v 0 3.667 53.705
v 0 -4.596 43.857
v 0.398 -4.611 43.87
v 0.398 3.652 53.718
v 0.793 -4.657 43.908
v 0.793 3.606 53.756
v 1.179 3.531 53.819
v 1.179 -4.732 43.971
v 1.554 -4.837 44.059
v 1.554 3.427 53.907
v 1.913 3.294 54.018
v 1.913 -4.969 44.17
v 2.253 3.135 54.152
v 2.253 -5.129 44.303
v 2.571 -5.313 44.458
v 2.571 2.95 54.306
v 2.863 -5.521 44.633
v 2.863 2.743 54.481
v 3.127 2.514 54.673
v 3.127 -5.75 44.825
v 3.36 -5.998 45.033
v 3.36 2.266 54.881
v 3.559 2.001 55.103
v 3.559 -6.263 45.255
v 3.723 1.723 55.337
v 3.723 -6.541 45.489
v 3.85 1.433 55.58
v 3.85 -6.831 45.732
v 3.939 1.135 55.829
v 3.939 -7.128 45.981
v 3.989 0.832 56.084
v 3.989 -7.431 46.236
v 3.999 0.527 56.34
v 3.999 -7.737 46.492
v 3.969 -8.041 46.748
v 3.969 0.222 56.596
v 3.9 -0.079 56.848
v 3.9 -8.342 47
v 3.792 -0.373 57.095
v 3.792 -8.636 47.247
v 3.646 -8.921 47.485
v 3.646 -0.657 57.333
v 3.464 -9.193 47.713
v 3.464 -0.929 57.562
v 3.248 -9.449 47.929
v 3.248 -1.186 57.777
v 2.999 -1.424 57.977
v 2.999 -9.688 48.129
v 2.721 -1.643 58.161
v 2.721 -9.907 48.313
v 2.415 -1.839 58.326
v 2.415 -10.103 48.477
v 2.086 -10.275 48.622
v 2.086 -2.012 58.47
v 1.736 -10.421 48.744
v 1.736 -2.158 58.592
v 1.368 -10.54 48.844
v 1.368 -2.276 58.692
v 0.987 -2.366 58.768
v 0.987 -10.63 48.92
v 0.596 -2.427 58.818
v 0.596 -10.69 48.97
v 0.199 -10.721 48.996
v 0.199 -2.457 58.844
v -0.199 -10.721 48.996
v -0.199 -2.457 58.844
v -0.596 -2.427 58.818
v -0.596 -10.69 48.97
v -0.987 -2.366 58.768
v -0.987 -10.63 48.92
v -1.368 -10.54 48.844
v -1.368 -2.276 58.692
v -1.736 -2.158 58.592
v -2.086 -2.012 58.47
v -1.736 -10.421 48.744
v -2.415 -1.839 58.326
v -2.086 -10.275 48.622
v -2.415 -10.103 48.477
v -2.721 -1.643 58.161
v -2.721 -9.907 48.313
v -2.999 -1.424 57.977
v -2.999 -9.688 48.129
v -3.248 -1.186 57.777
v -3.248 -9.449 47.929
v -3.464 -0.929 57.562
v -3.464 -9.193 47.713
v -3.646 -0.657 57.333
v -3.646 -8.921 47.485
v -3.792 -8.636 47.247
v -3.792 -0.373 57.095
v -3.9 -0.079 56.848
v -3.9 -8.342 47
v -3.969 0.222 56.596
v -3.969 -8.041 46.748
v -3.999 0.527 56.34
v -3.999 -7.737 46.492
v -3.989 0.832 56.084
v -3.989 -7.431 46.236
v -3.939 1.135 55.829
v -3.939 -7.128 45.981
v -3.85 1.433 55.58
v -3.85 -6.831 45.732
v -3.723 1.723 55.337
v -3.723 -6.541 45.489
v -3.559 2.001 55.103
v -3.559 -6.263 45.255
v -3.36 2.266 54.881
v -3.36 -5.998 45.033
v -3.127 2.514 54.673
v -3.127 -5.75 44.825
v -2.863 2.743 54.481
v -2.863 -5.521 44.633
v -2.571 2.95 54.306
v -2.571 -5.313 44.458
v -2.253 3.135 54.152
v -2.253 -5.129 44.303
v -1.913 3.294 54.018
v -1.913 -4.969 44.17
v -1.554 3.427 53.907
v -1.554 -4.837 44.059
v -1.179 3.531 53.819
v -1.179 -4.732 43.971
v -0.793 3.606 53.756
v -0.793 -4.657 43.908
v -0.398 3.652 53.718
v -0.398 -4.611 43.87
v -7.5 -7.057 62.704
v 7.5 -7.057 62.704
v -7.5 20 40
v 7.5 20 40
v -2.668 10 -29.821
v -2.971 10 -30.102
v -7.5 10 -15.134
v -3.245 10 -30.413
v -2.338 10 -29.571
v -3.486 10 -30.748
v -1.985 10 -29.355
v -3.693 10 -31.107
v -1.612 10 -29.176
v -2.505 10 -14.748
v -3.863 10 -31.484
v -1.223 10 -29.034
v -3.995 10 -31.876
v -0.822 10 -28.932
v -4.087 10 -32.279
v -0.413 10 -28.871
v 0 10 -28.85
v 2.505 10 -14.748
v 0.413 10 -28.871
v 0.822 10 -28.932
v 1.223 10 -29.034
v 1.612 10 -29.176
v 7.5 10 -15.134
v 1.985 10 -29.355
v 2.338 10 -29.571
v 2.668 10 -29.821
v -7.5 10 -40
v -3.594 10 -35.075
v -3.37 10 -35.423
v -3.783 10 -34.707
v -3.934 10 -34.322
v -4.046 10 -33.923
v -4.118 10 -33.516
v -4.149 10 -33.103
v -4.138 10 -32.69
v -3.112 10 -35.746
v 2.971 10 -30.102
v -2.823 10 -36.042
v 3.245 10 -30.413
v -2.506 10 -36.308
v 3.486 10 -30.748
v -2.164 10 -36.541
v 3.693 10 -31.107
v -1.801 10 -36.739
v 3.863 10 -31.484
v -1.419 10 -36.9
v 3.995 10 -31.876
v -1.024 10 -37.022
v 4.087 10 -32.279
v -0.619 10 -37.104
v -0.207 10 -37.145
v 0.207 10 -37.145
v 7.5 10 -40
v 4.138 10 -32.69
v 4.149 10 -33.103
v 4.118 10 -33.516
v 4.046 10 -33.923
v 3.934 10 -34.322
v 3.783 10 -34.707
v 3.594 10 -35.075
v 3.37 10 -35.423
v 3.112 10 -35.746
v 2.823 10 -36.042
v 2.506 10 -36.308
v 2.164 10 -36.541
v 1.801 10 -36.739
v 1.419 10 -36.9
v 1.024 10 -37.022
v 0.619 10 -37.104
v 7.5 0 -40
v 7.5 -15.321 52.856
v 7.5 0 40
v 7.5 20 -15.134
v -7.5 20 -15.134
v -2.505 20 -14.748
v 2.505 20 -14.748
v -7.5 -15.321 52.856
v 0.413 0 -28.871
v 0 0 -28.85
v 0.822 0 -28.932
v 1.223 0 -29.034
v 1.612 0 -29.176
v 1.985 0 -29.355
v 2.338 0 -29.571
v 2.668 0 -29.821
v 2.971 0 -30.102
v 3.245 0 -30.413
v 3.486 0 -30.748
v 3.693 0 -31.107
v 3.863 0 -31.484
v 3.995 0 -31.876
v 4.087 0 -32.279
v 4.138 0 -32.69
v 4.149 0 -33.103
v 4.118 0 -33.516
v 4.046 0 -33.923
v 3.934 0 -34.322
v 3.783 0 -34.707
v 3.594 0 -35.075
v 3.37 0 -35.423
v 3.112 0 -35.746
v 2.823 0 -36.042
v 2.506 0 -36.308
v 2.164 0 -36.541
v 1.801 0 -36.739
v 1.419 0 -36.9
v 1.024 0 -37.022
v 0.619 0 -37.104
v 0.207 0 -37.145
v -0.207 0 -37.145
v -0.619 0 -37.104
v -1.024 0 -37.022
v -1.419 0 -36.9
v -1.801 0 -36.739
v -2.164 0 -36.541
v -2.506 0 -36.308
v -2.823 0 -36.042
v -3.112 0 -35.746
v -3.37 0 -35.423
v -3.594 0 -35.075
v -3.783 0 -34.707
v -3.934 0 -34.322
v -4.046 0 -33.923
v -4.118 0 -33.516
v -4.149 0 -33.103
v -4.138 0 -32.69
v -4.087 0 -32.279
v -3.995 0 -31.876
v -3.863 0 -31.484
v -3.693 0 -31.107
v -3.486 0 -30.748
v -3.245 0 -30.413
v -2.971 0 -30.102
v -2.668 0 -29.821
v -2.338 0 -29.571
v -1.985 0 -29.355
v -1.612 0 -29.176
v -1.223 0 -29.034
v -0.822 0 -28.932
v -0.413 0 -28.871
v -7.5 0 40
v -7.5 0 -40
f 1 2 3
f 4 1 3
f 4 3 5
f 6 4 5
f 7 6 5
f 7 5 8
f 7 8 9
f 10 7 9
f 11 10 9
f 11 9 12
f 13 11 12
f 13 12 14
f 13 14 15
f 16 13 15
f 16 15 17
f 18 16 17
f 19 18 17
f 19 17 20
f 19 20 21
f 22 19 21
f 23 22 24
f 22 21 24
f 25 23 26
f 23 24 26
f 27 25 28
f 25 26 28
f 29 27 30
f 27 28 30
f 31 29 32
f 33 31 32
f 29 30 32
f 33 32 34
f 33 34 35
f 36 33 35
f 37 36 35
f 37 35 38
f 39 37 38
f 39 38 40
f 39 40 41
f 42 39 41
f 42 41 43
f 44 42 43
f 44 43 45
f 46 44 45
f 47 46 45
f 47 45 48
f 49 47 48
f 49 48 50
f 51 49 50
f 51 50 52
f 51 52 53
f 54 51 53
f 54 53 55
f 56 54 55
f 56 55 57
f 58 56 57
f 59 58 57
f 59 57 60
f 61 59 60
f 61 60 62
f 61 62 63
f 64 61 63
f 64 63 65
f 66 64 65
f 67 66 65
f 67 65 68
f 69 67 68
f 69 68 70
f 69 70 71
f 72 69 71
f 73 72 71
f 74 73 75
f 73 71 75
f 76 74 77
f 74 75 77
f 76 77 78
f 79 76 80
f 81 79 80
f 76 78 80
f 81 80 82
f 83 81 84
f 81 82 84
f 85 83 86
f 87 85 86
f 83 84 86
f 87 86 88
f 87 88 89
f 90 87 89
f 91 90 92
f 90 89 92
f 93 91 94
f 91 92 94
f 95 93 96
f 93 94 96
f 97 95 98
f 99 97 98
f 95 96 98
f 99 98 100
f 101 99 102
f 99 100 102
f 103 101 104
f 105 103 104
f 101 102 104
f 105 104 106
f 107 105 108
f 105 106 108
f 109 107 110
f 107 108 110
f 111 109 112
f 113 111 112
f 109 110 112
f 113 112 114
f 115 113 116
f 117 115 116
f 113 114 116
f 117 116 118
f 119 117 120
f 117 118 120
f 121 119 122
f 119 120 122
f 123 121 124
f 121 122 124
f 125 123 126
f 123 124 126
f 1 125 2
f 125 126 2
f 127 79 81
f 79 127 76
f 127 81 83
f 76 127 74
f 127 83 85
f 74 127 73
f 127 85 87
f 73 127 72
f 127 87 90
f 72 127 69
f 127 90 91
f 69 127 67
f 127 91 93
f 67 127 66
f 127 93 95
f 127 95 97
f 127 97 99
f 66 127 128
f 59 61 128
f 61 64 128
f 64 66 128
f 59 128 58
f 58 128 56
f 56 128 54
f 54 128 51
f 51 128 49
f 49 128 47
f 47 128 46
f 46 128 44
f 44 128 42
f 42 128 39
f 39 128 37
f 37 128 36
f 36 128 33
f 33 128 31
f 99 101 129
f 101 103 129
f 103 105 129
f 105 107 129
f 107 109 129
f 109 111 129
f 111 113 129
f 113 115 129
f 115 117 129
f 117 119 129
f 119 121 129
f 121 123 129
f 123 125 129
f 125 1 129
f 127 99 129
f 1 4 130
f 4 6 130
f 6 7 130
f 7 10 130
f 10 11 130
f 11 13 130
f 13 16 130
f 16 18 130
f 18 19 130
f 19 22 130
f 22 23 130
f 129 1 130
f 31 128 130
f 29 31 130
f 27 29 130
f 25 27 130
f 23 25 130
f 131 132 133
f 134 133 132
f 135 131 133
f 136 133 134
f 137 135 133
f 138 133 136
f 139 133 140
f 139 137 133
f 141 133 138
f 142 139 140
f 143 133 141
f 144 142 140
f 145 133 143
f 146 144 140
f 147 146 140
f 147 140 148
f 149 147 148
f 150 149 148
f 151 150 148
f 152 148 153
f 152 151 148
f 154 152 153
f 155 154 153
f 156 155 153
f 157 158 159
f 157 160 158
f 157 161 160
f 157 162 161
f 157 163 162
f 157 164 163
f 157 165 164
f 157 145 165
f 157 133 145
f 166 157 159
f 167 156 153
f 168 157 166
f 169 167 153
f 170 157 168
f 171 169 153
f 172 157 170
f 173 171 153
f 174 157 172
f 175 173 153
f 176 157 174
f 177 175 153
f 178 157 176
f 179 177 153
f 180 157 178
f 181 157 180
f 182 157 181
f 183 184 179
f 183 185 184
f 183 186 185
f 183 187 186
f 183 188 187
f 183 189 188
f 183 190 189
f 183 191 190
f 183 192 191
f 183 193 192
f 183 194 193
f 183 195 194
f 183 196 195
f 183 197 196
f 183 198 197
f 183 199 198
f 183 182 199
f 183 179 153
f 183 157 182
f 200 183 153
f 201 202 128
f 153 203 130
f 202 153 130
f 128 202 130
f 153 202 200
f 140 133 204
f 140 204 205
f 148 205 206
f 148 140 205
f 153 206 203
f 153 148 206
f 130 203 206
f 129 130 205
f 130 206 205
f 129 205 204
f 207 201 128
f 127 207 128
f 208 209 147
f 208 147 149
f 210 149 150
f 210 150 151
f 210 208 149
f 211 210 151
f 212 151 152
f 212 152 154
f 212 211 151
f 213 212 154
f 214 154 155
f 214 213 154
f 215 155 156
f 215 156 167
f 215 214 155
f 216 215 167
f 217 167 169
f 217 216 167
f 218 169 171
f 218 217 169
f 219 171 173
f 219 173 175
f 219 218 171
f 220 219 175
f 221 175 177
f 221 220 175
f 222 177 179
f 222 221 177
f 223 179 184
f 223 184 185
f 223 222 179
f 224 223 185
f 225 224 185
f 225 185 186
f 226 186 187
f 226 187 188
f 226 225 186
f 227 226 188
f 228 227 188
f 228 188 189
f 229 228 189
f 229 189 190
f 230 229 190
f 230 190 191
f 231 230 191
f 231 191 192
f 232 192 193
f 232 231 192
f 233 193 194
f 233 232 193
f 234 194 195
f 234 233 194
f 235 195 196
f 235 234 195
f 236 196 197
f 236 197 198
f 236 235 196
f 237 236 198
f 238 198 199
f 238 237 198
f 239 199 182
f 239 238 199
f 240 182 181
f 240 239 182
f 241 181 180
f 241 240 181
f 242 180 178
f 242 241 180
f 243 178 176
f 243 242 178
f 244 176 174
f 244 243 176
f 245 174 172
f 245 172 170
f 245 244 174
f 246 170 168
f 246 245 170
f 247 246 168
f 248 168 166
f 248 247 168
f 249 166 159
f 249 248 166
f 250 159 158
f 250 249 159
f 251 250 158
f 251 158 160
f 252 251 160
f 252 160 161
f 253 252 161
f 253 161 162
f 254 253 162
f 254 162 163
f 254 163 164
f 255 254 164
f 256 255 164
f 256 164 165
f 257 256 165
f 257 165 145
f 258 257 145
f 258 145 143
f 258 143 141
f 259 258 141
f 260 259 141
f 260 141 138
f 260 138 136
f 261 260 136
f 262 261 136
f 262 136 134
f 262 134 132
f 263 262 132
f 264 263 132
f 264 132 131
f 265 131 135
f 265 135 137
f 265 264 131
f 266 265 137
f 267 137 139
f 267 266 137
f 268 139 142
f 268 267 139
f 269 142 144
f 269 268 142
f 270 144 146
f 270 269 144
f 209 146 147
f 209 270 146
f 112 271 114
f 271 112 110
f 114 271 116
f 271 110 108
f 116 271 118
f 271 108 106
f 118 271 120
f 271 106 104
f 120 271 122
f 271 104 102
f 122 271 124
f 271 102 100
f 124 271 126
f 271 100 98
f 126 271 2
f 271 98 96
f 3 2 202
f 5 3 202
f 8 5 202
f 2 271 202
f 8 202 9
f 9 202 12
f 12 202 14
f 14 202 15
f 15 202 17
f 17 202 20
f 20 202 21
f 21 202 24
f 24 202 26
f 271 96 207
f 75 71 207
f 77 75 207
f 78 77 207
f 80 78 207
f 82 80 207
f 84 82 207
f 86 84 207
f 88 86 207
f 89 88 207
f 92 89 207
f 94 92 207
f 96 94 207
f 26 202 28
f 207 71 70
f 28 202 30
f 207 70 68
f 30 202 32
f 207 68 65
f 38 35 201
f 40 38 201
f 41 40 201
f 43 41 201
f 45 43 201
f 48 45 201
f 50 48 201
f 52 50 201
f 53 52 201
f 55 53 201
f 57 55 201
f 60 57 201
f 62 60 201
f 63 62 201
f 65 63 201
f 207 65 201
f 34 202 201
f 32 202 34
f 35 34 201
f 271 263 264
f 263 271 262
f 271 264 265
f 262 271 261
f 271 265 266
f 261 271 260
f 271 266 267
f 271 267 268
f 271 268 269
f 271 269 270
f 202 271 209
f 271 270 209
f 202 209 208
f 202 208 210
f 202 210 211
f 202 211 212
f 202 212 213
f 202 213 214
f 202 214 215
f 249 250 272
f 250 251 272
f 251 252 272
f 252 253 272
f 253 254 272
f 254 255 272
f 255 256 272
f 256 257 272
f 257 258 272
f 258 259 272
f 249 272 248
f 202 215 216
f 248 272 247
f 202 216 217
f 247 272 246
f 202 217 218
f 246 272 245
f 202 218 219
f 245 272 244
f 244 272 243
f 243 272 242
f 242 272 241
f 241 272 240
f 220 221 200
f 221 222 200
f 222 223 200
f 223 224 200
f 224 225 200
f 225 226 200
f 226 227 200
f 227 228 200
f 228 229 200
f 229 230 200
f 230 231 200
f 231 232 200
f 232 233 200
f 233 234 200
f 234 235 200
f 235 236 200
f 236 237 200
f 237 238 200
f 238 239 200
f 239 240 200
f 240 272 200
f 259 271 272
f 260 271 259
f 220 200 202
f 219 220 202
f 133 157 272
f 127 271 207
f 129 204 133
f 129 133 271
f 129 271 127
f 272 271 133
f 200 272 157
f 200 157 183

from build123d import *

# Parameters (mm, degrees)
SKETCH1_W           = 15
SKETCH1_H           = 80
SKETCH1_R           = 4.15
BOSS_EXTRUDE1_DEPTH = 10
BOSS_EXTRUDE2_DEPTH = 10
BOSS_EXTRUDE4_DEPTH = 15
SKETCH11_R          = 4
CUT_EXTRUDE5_DEPTH  = 31.247894791


with BuildPart() as part:
    # Sketch1 → Boss-Extrude1 (new body)
    with BuildSketch(Plane(origin=(0, 0, 0), x_dir=(1, 0, 0), z_dir=(0, 1, 0))):
        Rectangle(SKETCH1_W, SKETCH1_H)
        with Locations(Location((0, 33, 0), (0, 0, 270))):  # turned: the seam where the file's is
            Circle(SKETCH1_R, mode=Mode.SUBTRACT)
    extrude(amount=BOSS_EXTRUDE1_DEPTH)

    # Sketch2 → Boss-Extrude2 (add)
    with BuildSketch(Plane(origin=(0, 10, 0), x_dir=(1, 0, 0), z_dir=(0, 1, 0))):
        with BuildLine():
            Line((7.5, 15.134142149), (7.5, -40))
            Line((7.5, -40), (-7.5, -40))
            Line((-7.5, -40), (-7.5, 15.134142149))
            ThreePointArc((-7.5, 15.134142149), (0, 14.7), (7.5, 15.134142149))
        make_face()
    extrude(amount=BOSS_EXTRUDE2_DEPTH)

    # Sketch10 → Boss-Extrude4 (add)
    with BuildSketch(Plane(origin=(7.5, 0, 0), x_dir=(0, 0, -1), z_dir=(1, 0, 0))):
        Polygon((-40, 0), (-52.855752194, -15.320888862), (-62.703829724, -7.057370639), (-40, 20), align=None)
    extrude(amount=-BOSS_EXTRUDE4_DEPTH)

    # Sketch11 → Cut-Extrude5 (cut, through all)
    with BuildSketch(Plane(origin=(0, 19.69615506, 23.472963553), x_dir=(-1, 0, 0), z_dir=(0, -0.64278761, -0.766044443))):
        with Locations(Location((0, -35.711504387, 0), (0, 0, 90))):  # turned: the seam where the file's is
            Circle(SKETCH11_R)
    extrude(amount=-CUT_EXTRUDE5_DEPTH, mode=Mode.SUBTRACT)


solid = part.part
